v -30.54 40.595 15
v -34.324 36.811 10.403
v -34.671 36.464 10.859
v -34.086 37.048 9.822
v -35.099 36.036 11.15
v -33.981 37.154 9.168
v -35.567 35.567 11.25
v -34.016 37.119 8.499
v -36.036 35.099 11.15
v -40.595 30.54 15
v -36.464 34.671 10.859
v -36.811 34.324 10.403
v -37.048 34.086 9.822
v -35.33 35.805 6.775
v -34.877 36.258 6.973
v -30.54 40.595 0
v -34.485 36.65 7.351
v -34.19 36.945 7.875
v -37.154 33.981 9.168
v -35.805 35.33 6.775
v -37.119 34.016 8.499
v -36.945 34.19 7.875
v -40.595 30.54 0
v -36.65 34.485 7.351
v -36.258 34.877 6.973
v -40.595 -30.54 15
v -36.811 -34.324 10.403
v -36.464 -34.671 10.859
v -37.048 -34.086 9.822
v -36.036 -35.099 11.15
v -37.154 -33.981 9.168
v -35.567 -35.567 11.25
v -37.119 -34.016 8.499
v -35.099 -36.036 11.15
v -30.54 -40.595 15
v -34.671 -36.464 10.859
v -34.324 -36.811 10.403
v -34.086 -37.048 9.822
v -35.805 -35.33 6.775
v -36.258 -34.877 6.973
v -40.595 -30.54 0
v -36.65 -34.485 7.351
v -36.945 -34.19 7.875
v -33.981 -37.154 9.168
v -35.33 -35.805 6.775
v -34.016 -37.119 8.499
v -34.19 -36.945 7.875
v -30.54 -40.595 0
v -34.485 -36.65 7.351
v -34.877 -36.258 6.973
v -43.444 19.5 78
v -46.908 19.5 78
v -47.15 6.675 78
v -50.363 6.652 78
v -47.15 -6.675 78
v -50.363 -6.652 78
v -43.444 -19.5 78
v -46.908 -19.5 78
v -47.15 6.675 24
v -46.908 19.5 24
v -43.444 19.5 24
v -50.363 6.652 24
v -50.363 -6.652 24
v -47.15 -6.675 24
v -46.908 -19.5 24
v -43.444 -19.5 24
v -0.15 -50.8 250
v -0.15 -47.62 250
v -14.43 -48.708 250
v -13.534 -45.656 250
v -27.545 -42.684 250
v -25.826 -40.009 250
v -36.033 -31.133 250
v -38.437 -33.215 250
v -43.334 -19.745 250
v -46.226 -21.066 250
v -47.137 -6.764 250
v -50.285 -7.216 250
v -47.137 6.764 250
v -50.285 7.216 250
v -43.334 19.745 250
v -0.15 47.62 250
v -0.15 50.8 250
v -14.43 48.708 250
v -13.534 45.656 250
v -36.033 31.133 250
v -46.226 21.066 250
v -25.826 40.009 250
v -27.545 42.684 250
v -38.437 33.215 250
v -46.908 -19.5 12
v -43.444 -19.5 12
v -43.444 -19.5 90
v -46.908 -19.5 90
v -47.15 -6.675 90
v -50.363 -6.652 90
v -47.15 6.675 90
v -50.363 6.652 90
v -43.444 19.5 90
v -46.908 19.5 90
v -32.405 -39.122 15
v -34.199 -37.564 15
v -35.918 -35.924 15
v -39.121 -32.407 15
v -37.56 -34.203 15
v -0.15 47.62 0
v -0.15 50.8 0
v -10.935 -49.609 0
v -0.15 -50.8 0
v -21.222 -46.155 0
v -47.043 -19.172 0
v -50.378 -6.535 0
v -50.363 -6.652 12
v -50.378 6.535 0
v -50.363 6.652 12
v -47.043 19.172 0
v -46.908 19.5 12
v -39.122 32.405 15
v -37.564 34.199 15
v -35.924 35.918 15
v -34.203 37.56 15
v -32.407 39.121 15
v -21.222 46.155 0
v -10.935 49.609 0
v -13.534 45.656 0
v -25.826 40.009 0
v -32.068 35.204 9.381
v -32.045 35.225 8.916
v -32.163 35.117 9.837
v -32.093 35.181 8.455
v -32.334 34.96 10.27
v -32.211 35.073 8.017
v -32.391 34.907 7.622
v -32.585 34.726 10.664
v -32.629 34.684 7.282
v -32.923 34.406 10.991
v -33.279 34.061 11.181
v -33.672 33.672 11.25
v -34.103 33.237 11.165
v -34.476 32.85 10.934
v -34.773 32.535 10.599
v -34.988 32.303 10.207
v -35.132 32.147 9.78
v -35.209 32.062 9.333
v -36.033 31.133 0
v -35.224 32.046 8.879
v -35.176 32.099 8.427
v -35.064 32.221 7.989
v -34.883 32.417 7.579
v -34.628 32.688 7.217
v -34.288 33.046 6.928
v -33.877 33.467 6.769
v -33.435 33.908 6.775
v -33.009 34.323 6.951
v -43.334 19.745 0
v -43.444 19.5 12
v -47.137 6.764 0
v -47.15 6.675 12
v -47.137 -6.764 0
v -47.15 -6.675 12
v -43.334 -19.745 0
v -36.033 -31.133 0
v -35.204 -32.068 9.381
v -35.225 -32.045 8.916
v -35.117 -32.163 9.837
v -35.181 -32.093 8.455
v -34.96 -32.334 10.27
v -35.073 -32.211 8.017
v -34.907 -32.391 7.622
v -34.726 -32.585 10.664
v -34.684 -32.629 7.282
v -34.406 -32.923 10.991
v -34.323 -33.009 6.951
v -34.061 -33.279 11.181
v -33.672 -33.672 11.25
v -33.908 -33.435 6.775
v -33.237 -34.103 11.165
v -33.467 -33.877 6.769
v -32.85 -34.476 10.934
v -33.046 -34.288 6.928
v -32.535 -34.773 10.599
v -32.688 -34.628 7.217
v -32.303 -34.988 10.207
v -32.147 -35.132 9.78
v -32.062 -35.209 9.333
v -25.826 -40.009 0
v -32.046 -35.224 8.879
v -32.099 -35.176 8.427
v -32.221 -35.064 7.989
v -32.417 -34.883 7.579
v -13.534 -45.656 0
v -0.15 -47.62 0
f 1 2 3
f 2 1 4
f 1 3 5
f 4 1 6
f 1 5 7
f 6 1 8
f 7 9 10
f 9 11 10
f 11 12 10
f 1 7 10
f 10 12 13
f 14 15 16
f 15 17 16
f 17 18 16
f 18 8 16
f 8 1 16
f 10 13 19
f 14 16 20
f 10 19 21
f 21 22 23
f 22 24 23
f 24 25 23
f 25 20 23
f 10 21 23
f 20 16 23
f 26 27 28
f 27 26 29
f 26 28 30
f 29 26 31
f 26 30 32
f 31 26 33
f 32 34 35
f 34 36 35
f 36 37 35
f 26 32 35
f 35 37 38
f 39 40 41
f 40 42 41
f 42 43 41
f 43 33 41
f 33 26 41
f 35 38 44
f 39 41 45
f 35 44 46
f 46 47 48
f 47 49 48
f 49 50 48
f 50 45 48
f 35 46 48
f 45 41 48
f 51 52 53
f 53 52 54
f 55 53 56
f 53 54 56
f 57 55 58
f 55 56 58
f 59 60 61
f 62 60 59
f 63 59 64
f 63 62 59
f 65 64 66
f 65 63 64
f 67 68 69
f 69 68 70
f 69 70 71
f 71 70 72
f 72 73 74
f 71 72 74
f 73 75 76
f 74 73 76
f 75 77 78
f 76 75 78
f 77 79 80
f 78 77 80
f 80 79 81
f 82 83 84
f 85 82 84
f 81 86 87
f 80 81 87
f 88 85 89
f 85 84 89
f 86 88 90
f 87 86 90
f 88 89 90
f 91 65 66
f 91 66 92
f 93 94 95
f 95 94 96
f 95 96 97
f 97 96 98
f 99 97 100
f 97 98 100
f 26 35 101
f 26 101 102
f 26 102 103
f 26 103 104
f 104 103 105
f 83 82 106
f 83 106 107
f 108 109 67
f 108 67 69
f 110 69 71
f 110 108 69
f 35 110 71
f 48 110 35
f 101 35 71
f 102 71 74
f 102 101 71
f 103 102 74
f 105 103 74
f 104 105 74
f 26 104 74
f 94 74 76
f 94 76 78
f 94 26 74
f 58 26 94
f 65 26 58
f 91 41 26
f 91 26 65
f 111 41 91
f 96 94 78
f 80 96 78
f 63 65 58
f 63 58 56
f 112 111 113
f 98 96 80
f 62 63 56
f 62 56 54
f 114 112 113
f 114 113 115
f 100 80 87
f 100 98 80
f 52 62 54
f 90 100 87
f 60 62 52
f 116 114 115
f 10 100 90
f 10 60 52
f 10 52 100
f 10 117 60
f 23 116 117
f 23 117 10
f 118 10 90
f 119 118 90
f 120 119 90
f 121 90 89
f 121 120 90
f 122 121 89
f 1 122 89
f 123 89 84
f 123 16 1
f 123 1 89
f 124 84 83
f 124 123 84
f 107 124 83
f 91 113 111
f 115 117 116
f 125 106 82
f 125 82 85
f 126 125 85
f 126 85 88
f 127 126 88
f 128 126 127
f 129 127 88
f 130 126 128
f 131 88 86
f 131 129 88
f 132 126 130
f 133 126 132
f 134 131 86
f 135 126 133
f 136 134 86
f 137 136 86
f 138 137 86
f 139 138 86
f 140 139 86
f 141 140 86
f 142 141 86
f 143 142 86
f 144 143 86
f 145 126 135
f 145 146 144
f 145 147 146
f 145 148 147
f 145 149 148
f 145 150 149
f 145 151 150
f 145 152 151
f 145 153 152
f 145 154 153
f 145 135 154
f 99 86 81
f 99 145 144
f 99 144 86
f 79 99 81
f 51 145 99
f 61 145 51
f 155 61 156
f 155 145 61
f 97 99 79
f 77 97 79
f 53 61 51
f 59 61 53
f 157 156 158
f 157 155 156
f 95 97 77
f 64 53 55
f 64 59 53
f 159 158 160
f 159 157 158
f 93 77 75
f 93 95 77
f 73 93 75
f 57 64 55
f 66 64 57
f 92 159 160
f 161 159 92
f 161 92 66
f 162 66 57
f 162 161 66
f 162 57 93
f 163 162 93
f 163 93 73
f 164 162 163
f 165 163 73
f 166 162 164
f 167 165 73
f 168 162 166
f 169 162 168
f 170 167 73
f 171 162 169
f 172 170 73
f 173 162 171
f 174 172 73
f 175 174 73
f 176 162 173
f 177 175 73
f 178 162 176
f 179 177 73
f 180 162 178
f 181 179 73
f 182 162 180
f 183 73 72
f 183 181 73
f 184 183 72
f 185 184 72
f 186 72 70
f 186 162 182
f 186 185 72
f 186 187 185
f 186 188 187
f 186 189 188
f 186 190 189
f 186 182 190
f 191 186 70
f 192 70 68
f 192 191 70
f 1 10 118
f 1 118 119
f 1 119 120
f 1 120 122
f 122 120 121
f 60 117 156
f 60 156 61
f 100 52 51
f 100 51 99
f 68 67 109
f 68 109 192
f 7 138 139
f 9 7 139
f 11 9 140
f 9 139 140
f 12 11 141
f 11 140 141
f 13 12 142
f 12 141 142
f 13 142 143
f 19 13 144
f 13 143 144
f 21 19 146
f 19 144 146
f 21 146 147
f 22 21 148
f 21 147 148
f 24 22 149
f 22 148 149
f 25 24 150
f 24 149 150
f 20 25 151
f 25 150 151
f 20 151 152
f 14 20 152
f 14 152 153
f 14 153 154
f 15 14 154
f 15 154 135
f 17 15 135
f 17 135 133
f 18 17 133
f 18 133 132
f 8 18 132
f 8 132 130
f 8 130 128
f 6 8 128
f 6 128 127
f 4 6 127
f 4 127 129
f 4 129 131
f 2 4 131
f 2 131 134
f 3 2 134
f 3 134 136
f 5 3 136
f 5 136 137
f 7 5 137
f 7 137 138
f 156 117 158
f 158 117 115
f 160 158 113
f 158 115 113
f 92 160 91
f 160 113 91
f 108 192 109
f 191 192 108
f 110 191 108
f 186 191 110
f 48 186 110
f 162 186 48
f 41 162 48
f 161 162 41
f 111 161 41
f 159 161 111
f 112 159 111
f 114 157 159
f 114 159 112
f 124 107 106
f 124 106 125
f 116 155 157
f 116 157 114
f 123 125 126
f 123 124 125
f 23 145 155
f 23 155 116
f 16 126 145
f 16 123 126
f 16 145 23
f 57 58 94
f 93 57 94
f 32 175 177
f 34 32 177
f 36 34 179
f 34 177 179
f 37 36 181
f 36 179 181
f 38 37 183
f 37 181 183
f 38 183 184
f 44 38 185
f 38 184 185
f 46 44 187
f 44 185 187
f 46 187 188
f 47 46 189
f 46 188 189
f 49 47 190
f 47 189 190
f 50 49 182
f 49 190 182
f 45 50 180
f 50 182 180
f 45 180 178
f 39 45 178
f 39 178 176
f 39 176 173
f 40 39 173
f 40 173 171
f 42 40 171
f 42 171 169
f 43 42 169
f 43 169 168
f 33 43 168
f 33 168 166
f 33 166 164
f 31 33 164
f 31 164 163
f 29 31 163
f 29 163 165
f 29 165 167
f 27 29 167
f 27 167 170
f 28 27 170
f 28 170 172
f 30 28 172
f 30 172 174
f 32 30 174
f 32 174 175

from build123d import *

# Parameters (mm, degrees)
BOSS_EXTRUDE1_DEPTH      = 250
M4_CLEARANCE_HOLE1_D     = 4.5
M4_CLEARANCE_HOLE1_DEPTH = 15
M4_CLEARANCE_HOLE1_TIP   = 1.351936393
M4_CLEARANCE_HOLE2_D     = 4.5
M4_CLEARANCE_HOLE2_DEPTH = 15
M4_CLEARANCE_HOLE2_TIP   = 1.351936393
SKETCH9_W                = 12
SKETCH9_H                = 39
CUT_EXTRUDE1_DEPTH       = 10
CUT_EXTRUDE2_DEPTH       = 15
CIRPATTERN1_COUNT        = 2
CIRPATTERN1_ANGLE        = 270
CUT_EXTRUDE4_DEPTH       = 261.117819555


with BuildPart() as part:
    # Sketch1 → Boss-Extrude1 (new body)
    with BuildSketch(Plane.XY):
        with BuildLine():
            Line((0, 50.8), (0, 47.62))
            ThreePointArc((0, 47.62), (-47.62, 0), (0, -47.62))
            Line((0, -47.62), (0, -50.8))
            ThreePointArc((0, -50.8), (-50.8, 0), (0, 50.8))
        make_face()
    extrude(amount=BOSS_EXTRUDE1_DEPTH)

    # M4 Clearance Hole1
    with Locations(Plane(origin=(-35.921024484, 35.921024484, 0), x_dir=(0, 0, -1), z_dir=(-0.707106781186549, 0.7071067811865461, 0))):
        with Locations((-9, 0)):
            Hole(M4_CLEARANCE_HOLE1_D / 2, depth=M4_CLEARANCE_HOLE1_DEPTH)
            with Locations((0, 0, -(M4_CLEARANCE_HOLE1_DEPTH + M4_CLEARANCE_HOLE1_TIP / 2))):  # 118° drill point
                Cone(0, M4_CLEARANCE_HOLE1_D / 2, M4_CLEARANCE_HOLE1_TIP, mode=Mode.SUBTRACT)

    # M4 Clearance Hole2
    with Locations(Plane(origin=(-35.921024484, -35.921024484, 0), x_dir=(0, 0, -1), z_dir=(-0.7071067811865588, -0.7071067811865362, 0))):
        with Locations((-9, 0)):
            Hole(M4_CLEARANCE_HOLE2_D / 2, depth=M4_CLEARANCE_HOLE2_DEPTH)
            with Locations((0, 0, -(M4_CLEARANCE_HOLE2_DEPTH + M4_CLEARANCE_HOLE2_TIP / 2))):  # 118° drill point
                Cone(0, M4_CLEARANCE_HOLE2_D / 2, M4_CLEARANCE_HOLE2_TIP, mode=Mode.SUBTRACT)

    # Sketch9 → Cut-Extrude1 (cut)
    with BuildSketch(Plane.ZY.offset(50.8)):
        with Locations((84, 0)):
            Rectangle(SKETCH9_W, SKETCH9_H)
        with Locations((18, 0)):
            Rectangle(SKETCH9_W, SKETCH9_H)
    extrude(amount=-CUT_EXTRUDE1_DEPTH, mode=Mode.SUBTRACT)

    # Sketch14 → Cut-Extrude2 (cut)
    with BuildSketch(Plane(origin=(0, 0, 0), x_dir=(-1, 0, 0), z_dir=(0, 0, -1))):
        with BuildLine():
            ThreePointArc((40.594896689, 30.540045233), (35.921024484, 35.921024484), (30.540045233, 40.594896689))
            Line((30.540045233, 40.594896689), (40.594896689, 30.540045233))
        make_face()
    cut_extrude2 = extrude(amount=-CUT_EXTRUDE2_DEPTH, mode=Mode.SUBTRACT)

    # CirPattern1: Cut-Extrude2 ×2 about axis
    cirpattern1_axis = Axis((0, 0, 250), (0, 0, -1))
    for i in range(1, CIRPATTERN1_COUNT):
        add(cut_extrude2.rotate(cirpattern1_axis, i * CIRPATTERN1_ANGLE / (CIRPATTERN1_COUNT - 1)), mode=Mode.SUBTRACT)

    # Sketch15 → Cut-Extrude4 (cut, through all)
    with BuildSketch(Plane(origin=(0, 0, 0), x_dir=(-1, 0, 0), z_dir=(0, 0, -1))):
        Polygon((0, 50.8), (0.15, 50.8), (0.15, -50.799778543), (0.15, -50.826071735), (0, -50.826071735), (0, -50.799778543), align=None)
    extrude(amount=-CUT_EXTRUDE4_DEPTH, mode=Mode.SUBTRACT)


solid = part.part
